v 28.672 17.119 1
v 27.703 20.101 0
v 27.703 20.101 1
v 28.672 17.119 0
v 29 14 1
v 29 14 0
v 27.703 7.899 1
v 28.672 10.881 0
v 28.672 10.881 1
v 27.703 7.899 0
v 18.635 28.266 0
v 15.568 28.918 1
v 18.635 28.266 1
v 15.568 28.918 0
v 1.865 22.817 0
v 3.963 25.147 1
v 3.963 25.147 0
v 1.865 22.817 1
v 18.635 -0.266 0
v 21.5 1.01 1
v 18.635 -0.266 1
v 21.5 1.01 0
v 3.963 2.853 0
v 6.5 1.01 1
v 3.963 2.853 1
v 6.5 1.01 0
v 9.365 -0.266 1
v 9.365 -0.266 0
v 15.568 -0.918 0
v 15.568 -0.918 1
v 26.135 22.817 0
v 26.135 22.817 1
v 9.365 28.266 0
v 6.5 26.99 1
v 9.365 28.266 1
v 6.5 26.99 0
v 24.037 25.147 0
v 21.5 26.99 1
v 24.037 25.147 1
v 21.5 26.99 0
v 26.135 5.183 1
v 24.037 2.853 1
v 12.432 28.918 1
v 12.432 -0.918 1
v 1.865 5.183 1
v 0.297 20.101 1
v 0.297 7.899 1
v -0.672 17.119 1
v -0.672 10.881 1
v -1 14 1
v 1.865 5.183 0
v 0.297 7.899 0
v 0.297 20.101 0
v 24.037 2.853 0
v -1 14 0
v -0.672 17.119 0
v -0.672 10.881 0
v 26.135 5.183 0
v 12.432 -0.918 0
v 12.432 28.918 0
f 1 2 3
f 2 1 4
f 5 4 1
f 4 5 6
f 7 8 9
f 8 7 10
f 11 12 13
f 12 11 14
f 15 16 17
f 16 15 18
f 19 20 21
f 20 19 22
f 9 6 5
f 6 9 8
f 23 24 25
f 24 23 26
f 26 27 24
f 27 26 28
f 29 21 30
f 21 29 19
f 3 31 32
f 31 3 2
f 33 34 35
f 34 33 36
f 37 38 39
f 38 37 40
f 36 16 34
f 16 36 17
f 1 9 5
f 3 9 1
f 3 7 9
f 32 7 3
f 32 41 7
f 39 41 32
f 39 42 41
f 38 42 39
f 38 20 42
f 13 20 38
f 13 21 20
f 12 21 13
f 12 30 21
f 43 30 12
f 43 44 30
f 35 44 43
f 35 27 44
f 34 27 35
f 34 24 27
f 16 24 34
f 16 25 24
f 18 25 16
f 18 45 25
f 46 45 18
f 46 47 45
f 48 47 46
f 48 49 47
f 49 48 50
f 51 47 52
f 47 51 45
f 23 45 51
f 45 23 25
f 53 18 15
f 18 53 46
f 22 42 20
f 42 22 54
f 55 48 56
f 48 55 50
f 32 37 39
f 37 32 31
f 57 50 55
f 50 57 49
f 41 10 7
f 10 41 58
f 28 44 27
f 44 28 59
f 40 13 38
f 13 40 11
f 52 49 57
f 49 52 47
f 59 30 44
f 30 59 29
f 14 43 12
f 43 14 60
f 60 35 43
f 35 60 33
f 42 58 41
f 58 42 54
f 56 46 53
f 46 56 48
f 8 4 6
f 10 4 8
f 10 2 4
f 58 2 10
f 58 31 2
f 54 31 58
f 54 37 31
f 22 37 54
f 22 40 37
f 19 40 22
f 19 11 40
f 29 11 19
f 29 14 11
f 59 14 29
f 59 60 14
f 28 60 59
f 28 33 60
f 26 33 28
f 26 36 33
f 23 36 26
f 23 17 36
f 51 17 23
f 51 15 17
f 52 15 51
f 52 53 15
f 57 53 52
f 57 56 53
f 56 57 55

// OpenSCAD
// Grid
// By Dana Woodman <dana@danawoodman.com>


// Settings
//--------------------------
module roundgrid(width=30,height=30,cols=10,rows=10,border=4,spacing=.8)
{
ra = width / 2;

// The magic...
//--------------------------

// Calculated inner width of dispaly area.
innerWidth = (width - (2 * border));
innerHeight = (height - (2 * border));
//echo("innerWidth", innerWidth, "innerHeight", innerHeight);

// Calculate size of the squares.
function dimension(size, divisions) = (size - ((divisions + 1) * spacing)) / divisions;
xWidth = dimension(innerWidth, cols);
yWidth = dimension(innerHeight, rows);
//echo("xWidth", xWidth, "yWidth", yWidth);

function calculate_location(size, index, spacing) = (size + spacing) * index;

// Subtract the squares from the display area.
difference() {

	// The display area
    translate([ra - 1 ,ra - 1,0]) cylinder(r=ra,h=1);

	// Offset by border size.
	translate([border, border])

		// Iterate over all the columns.
		for (col = [0 : cols - 1]) {
			
			// Iterate over all the rows.
			for (row = [0 : rows - 1]) {

				// Caclulate position of each square
				translate([
					calculate_location(xWidth, col, spacing), 
					calculate_location(yWidth, row, spacing)
				])
					square([xWidth, yWidth]);
			}
		}
 }
}

roundgrid();
